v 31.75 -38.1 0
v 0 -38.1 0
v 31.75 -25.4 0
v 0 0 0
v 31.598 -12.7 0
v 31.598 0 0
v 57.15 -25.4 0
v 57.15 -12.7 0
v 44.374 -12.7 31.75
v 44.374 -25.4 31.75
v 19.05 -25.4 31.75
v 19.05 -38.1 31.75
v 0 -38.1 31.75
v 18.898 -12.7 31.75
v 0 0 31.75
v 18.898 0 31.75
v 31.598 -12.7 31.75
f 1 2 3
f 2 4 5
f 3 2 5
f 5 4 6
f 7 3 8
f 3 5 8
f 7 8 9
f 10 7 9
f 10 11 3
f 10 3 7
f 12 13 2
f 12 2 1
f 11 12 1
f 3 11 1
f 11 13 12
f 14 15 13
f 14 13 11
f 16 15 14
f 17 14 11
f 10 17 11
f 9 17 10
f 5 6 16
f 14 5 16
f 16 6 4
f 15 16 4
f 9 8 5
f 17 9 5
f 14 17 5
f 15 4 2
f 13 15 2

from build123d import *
from build123d import SkipClean  # not in build123d's __all__

# Parameters (mm, degrees)
F1_DEPTH = 31.75
F3_DEPTH = 12.7
F5_DEPTH = 12.7
F7_DEPTH = 25.401


with BuildPart() as f1:
    # F0 (on Top) → F1 (new body)
    with BuildSketch(Plane.XY):
        Polygon((31.597598396, 0), (0, -0.0003033445), (0, -38.1), (31.75, -38.1), (31.75, -25.4), (57.15, -25.4), (57.15, -12.7), (31.597598396, -12.7), align=None)
    extrude(amount=F1_DEPTH)

    # F2 (on face) → F3 (cut)
    with BuildSketch(Plane.XZ.offset(38.1)):
        Polygon((31.75, 0), (31.75, 31.75), (19.05, 31.75), align=None)
    extrude(amount=-F3_DEPTH, mode=Mode.SUBTRACT)

    # F4 (on face) → F5 (cut)
    with BuildSketch(Plane(origin=(2.9e-09, -0.0003033445, 0), x_dir=(-1, -9.6002e-06, 0), z_dir=(-9.6002e-06, 1, 0))):
        Polygon((-18.8975983945, 31.75), (-31.5975983945, 31.75), (-31.5975983945, 0), align=None)
    with SkipClean():  # cleaning this boolean's faces spoils the solid; the shape is the same uncleaned
        extrude(amount=-F5_DEPTH, mode=Mode.SUBTRACT)

    # F6 (on face) → F7 (cut, through all)
    with BuildSketch(Plane(origin=(0, -12.7, 0), x_dir=(-1, 0, 0), z_dir=(0, 1, 0))):
        Polygon((-44.373799198, 31.75), (-57.15, 31.75), (-57.15, 0), align=None)
    extrude(amount=-F7_DEPTH, mode=Mode.SUBTRACT)


solid = f1.part
